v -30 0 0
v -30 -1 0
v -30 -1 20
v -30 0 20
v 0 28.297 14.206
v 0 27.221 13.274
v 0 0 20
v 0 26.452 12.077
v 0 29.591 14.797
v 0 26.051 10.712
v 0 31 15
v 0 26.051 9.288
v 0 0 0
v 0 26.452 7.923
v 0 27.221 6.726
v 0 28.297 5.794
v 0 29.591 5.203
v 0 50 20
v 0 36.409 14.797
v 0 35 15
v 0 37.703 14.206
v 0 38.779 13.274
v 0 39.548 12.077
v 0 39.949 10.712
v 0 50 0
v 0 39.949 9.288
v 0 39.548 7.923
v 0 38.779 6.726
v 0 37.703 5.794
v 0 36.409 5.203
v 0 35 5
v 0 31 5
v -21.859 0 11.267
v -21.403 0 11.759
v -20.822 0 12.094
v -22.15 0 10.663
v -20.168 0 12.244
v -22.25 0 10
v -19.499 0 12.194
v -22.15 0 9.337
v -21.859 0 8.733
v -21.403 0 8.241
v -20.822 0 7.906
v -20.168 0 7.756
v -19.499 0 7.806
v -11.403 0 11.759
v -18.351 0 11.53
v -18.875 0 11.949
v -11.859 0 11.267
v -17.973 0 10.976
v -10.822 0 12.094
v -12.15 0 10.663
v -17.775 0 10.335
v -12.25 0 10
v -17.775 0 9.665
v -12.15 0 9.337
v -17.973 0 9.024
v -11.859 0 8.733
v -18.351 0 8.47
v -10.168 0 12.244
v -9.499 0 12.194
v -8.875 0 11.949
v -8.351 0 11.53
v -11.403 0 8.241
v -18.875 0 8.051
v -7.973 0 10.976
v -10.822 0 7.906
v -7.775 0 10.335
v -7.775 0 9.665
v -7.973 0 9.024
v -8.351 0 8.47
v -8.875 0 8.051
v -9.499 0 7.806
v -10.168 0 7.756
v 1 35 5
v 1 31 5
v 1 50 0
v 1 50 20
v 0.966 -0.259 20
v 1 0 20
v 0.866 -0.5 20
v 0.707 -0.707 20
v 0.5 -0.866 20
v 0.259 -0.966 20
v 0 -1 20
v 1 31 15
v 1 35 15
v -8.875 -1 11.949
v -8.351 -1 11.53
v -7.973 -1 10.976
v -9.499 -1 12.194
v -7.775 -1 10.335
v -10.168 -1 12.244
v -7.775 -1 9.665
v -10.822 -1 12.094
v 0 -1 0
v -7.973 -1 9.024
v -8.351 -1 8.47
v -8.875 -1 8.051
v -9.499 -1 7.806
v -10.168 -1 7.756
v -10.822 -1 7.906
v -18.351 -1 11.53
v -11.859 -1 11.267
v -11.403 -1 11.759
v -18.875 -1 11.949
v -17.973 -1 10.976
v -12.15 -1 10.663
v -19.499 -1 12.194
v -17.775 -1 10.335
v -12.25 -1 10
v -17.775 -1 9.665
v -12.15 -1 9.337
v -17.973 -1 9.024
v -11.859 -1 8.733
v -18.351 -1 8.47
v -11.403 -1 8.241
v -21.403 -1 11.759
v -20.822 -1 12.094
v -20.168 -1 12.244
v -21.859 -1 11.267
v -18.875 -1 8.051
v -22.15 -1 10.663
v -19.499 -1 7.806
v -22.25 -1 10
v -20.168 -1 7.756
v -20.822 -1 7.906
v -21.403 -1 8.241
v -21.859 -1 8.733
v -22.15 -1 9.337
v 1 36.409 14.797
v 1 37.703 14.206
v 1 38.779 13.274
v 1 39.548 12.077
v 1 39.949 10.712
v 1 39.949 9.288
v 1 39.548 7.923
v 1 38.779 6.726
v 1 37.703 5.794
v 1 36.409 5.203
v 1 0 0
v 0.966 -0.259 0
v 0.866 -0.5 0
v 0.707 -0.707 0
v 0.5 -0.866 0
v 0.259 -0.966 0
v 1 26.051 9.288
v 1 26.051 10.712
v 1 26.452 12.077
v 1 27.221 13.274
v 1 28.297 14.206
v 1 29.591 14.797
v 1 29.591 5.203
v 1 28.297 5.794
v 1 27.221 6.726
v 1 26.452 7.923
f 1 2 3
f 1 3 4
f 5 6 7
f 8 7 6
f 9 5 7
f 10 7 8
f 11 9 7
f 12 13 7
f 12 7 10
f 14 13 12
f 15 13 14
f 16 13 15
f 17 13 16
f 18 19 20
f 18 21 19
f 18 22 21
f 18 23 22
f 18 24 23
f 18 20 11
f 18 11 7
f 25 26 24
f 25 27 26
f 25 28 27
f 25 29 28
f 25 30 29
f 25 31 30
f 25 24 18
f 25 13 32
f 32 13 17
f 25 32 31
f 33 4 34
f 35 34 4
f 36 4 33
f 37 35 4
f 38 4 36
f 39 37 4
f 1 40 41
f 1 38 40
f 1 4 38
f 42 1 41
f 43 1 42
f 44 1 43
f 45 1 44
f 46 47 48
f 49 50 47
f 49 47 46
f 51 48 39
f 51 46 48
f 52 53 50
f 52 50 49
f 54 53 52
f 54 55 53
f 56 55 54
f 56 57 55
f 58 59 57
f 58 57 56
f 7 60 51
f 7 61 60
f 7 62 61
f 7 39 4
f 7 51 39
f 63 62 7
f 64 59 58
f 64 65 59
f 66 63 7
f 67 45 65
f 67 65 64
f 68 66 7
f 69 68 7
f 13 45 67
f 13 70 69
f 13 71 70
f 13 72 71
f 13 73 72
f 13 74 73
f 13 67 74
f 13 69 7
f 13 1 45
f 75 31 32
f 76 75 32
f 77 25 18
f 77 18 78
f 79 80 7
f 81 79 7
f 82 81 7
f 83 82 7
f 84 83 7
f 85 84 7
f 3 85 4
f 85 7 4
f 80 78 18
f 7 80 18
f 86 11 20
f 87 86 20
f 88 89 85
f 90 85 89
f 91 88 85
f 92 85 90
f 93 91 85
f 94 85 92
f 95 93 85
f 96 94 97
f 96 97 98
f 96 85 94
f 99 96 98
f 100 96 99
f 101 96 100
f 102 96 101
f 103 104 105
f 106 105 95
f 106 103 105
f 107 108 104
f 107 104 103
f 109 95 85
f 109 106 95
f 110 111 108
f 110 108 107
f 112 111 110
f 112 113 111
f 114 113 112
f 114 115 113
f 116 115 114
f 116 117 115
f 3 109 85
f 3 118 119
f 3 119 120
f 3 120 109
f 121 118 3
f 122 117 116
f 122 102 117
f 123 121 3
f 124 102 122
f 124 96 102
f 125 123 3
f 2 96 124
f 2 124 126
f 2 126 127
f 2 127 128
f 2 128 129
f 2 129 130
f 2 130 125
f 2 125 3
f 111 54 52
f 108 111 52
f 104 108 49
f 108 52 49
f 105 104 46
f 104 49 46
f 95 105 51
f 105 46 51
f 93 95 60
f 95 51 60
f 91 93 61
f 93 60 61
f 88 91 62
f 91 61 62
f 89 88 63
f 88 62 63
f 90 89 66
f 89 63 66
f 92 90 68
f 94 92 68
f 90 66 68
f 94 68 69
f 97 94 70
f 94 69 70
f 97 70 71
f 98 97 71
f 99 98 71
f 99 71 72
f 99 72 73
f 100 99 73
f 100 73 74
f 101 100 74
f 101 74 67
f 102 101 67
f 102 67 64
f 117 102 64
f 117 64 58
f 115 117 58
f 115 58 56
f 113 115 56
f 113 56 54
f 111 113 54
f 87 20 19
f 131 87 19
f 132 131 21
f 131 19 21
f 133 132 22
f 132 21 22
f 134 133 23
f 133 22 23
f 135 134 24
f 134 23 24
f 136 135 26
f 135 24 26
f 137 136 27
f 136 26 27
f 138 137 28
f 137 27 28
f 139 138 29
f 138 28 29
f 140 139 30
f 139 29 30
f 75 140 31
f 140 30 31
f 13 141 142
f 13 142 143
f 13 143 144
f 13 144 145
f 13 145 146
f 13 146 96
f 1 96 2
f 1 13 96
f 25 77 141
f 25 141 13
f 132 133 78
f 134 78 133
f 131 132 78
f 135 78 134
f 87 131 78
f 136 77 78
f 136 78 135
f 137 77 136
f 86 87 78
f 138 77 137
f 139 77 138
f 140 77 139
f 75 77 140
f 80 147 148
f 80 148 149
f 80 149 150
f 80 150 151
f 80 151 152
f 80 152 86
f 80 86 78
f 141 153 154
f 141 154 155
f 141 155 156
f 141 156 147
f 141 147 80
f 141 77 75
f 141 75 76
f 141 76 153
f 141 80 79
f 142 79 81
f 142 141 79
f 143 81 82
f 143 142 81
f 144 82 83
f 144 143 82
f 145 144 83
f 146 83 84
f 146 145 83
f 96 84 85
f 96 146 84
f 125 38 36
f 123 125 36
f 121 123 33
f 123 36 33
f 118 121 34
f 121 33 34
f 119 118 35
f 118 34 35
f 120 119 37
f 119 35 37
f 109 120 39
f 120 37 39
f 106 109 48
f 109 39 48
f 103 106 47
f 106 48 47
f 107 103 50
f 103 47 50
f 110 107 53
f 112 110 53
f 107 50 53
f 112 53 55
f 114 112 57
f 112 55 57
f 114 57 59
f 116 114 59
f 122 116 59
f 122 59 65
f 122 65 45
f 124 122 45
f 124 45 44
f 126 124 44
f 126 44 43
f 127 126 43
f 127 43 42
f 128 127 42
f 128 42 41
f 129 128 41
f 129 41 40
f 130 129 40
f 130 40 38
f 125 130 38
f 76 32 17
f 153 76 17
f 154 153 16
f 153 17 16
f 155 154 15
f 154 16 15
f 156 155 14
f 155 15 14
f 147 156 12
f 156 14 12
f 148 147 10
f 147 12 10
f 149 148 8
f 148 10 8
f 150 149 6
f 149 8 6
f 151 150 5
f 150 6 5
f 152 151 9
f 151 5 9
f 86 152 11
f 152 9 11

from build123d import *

# Parameters (mm, degrees)
EXTRUSION1_DEPTH        = 20
ENL_V_MAT_EXTRU_1_DEPTH = 62.64414003
ESQUISSE3_R             = 2.25
ENL_V_MAT_EXTRU_2_DEPTH = 62.64414003


with BuildPart() as part:
    # Esquisse1 → Extrusion1 (new body)
    with BuildSketch(Plane.XY):
        with BuildLine():
            Line((0, 0), (0, 50))
            Line((0, 50), (1, 50))
            Line((1, 50), (1, 0))
            ThreePointArc((1, 0), (0.707106781, -0.707106781), (0, -1))
            Line((0, -1), (-30, -1))
            Line((-30, -1), (-30, 0))
            Line((-30, 0), (0, 0))
        make_face()
    extrude(amount=EXTRUSION1_DEPTH)

    # Esquisse2 → Enlèv. mat.-Extru.1 (cut, through all)
    with BuildSketch(Plane.ZY):
        with BuildLine():
            Line((5, 35), (5, 31))
            ThreePointArc((5, 31), (10, 26), (15, 31))
            Line((15, 31), (15, 35))
            ThreePointArc((15, 35), (10, 40), (5, 35))
        make_face()
    extrude(amount=-ENL_V_MAT_EXTRU_1_DEPTH, mode=Mode.SUBTRACT)

    # Esquisse3 → Enlèv. mat.-Extru.2 (cut, through all)
    with BuildSketch(Plane(origin=(0, 0, 0), x_dir=(-1, 0, 0), z_dir=(0, 1, 0))):
        with Locations((10, 10)):
            Circle(ESQUISSE3_R)
        with Locations((20, 10)):
            Circle(ESQUISSE3_R)
    extrude(amount=-ENL_V_MAT_EXTRU_2_DEPTH, mode=Mode.SUBTRACT)


solid = part.part
